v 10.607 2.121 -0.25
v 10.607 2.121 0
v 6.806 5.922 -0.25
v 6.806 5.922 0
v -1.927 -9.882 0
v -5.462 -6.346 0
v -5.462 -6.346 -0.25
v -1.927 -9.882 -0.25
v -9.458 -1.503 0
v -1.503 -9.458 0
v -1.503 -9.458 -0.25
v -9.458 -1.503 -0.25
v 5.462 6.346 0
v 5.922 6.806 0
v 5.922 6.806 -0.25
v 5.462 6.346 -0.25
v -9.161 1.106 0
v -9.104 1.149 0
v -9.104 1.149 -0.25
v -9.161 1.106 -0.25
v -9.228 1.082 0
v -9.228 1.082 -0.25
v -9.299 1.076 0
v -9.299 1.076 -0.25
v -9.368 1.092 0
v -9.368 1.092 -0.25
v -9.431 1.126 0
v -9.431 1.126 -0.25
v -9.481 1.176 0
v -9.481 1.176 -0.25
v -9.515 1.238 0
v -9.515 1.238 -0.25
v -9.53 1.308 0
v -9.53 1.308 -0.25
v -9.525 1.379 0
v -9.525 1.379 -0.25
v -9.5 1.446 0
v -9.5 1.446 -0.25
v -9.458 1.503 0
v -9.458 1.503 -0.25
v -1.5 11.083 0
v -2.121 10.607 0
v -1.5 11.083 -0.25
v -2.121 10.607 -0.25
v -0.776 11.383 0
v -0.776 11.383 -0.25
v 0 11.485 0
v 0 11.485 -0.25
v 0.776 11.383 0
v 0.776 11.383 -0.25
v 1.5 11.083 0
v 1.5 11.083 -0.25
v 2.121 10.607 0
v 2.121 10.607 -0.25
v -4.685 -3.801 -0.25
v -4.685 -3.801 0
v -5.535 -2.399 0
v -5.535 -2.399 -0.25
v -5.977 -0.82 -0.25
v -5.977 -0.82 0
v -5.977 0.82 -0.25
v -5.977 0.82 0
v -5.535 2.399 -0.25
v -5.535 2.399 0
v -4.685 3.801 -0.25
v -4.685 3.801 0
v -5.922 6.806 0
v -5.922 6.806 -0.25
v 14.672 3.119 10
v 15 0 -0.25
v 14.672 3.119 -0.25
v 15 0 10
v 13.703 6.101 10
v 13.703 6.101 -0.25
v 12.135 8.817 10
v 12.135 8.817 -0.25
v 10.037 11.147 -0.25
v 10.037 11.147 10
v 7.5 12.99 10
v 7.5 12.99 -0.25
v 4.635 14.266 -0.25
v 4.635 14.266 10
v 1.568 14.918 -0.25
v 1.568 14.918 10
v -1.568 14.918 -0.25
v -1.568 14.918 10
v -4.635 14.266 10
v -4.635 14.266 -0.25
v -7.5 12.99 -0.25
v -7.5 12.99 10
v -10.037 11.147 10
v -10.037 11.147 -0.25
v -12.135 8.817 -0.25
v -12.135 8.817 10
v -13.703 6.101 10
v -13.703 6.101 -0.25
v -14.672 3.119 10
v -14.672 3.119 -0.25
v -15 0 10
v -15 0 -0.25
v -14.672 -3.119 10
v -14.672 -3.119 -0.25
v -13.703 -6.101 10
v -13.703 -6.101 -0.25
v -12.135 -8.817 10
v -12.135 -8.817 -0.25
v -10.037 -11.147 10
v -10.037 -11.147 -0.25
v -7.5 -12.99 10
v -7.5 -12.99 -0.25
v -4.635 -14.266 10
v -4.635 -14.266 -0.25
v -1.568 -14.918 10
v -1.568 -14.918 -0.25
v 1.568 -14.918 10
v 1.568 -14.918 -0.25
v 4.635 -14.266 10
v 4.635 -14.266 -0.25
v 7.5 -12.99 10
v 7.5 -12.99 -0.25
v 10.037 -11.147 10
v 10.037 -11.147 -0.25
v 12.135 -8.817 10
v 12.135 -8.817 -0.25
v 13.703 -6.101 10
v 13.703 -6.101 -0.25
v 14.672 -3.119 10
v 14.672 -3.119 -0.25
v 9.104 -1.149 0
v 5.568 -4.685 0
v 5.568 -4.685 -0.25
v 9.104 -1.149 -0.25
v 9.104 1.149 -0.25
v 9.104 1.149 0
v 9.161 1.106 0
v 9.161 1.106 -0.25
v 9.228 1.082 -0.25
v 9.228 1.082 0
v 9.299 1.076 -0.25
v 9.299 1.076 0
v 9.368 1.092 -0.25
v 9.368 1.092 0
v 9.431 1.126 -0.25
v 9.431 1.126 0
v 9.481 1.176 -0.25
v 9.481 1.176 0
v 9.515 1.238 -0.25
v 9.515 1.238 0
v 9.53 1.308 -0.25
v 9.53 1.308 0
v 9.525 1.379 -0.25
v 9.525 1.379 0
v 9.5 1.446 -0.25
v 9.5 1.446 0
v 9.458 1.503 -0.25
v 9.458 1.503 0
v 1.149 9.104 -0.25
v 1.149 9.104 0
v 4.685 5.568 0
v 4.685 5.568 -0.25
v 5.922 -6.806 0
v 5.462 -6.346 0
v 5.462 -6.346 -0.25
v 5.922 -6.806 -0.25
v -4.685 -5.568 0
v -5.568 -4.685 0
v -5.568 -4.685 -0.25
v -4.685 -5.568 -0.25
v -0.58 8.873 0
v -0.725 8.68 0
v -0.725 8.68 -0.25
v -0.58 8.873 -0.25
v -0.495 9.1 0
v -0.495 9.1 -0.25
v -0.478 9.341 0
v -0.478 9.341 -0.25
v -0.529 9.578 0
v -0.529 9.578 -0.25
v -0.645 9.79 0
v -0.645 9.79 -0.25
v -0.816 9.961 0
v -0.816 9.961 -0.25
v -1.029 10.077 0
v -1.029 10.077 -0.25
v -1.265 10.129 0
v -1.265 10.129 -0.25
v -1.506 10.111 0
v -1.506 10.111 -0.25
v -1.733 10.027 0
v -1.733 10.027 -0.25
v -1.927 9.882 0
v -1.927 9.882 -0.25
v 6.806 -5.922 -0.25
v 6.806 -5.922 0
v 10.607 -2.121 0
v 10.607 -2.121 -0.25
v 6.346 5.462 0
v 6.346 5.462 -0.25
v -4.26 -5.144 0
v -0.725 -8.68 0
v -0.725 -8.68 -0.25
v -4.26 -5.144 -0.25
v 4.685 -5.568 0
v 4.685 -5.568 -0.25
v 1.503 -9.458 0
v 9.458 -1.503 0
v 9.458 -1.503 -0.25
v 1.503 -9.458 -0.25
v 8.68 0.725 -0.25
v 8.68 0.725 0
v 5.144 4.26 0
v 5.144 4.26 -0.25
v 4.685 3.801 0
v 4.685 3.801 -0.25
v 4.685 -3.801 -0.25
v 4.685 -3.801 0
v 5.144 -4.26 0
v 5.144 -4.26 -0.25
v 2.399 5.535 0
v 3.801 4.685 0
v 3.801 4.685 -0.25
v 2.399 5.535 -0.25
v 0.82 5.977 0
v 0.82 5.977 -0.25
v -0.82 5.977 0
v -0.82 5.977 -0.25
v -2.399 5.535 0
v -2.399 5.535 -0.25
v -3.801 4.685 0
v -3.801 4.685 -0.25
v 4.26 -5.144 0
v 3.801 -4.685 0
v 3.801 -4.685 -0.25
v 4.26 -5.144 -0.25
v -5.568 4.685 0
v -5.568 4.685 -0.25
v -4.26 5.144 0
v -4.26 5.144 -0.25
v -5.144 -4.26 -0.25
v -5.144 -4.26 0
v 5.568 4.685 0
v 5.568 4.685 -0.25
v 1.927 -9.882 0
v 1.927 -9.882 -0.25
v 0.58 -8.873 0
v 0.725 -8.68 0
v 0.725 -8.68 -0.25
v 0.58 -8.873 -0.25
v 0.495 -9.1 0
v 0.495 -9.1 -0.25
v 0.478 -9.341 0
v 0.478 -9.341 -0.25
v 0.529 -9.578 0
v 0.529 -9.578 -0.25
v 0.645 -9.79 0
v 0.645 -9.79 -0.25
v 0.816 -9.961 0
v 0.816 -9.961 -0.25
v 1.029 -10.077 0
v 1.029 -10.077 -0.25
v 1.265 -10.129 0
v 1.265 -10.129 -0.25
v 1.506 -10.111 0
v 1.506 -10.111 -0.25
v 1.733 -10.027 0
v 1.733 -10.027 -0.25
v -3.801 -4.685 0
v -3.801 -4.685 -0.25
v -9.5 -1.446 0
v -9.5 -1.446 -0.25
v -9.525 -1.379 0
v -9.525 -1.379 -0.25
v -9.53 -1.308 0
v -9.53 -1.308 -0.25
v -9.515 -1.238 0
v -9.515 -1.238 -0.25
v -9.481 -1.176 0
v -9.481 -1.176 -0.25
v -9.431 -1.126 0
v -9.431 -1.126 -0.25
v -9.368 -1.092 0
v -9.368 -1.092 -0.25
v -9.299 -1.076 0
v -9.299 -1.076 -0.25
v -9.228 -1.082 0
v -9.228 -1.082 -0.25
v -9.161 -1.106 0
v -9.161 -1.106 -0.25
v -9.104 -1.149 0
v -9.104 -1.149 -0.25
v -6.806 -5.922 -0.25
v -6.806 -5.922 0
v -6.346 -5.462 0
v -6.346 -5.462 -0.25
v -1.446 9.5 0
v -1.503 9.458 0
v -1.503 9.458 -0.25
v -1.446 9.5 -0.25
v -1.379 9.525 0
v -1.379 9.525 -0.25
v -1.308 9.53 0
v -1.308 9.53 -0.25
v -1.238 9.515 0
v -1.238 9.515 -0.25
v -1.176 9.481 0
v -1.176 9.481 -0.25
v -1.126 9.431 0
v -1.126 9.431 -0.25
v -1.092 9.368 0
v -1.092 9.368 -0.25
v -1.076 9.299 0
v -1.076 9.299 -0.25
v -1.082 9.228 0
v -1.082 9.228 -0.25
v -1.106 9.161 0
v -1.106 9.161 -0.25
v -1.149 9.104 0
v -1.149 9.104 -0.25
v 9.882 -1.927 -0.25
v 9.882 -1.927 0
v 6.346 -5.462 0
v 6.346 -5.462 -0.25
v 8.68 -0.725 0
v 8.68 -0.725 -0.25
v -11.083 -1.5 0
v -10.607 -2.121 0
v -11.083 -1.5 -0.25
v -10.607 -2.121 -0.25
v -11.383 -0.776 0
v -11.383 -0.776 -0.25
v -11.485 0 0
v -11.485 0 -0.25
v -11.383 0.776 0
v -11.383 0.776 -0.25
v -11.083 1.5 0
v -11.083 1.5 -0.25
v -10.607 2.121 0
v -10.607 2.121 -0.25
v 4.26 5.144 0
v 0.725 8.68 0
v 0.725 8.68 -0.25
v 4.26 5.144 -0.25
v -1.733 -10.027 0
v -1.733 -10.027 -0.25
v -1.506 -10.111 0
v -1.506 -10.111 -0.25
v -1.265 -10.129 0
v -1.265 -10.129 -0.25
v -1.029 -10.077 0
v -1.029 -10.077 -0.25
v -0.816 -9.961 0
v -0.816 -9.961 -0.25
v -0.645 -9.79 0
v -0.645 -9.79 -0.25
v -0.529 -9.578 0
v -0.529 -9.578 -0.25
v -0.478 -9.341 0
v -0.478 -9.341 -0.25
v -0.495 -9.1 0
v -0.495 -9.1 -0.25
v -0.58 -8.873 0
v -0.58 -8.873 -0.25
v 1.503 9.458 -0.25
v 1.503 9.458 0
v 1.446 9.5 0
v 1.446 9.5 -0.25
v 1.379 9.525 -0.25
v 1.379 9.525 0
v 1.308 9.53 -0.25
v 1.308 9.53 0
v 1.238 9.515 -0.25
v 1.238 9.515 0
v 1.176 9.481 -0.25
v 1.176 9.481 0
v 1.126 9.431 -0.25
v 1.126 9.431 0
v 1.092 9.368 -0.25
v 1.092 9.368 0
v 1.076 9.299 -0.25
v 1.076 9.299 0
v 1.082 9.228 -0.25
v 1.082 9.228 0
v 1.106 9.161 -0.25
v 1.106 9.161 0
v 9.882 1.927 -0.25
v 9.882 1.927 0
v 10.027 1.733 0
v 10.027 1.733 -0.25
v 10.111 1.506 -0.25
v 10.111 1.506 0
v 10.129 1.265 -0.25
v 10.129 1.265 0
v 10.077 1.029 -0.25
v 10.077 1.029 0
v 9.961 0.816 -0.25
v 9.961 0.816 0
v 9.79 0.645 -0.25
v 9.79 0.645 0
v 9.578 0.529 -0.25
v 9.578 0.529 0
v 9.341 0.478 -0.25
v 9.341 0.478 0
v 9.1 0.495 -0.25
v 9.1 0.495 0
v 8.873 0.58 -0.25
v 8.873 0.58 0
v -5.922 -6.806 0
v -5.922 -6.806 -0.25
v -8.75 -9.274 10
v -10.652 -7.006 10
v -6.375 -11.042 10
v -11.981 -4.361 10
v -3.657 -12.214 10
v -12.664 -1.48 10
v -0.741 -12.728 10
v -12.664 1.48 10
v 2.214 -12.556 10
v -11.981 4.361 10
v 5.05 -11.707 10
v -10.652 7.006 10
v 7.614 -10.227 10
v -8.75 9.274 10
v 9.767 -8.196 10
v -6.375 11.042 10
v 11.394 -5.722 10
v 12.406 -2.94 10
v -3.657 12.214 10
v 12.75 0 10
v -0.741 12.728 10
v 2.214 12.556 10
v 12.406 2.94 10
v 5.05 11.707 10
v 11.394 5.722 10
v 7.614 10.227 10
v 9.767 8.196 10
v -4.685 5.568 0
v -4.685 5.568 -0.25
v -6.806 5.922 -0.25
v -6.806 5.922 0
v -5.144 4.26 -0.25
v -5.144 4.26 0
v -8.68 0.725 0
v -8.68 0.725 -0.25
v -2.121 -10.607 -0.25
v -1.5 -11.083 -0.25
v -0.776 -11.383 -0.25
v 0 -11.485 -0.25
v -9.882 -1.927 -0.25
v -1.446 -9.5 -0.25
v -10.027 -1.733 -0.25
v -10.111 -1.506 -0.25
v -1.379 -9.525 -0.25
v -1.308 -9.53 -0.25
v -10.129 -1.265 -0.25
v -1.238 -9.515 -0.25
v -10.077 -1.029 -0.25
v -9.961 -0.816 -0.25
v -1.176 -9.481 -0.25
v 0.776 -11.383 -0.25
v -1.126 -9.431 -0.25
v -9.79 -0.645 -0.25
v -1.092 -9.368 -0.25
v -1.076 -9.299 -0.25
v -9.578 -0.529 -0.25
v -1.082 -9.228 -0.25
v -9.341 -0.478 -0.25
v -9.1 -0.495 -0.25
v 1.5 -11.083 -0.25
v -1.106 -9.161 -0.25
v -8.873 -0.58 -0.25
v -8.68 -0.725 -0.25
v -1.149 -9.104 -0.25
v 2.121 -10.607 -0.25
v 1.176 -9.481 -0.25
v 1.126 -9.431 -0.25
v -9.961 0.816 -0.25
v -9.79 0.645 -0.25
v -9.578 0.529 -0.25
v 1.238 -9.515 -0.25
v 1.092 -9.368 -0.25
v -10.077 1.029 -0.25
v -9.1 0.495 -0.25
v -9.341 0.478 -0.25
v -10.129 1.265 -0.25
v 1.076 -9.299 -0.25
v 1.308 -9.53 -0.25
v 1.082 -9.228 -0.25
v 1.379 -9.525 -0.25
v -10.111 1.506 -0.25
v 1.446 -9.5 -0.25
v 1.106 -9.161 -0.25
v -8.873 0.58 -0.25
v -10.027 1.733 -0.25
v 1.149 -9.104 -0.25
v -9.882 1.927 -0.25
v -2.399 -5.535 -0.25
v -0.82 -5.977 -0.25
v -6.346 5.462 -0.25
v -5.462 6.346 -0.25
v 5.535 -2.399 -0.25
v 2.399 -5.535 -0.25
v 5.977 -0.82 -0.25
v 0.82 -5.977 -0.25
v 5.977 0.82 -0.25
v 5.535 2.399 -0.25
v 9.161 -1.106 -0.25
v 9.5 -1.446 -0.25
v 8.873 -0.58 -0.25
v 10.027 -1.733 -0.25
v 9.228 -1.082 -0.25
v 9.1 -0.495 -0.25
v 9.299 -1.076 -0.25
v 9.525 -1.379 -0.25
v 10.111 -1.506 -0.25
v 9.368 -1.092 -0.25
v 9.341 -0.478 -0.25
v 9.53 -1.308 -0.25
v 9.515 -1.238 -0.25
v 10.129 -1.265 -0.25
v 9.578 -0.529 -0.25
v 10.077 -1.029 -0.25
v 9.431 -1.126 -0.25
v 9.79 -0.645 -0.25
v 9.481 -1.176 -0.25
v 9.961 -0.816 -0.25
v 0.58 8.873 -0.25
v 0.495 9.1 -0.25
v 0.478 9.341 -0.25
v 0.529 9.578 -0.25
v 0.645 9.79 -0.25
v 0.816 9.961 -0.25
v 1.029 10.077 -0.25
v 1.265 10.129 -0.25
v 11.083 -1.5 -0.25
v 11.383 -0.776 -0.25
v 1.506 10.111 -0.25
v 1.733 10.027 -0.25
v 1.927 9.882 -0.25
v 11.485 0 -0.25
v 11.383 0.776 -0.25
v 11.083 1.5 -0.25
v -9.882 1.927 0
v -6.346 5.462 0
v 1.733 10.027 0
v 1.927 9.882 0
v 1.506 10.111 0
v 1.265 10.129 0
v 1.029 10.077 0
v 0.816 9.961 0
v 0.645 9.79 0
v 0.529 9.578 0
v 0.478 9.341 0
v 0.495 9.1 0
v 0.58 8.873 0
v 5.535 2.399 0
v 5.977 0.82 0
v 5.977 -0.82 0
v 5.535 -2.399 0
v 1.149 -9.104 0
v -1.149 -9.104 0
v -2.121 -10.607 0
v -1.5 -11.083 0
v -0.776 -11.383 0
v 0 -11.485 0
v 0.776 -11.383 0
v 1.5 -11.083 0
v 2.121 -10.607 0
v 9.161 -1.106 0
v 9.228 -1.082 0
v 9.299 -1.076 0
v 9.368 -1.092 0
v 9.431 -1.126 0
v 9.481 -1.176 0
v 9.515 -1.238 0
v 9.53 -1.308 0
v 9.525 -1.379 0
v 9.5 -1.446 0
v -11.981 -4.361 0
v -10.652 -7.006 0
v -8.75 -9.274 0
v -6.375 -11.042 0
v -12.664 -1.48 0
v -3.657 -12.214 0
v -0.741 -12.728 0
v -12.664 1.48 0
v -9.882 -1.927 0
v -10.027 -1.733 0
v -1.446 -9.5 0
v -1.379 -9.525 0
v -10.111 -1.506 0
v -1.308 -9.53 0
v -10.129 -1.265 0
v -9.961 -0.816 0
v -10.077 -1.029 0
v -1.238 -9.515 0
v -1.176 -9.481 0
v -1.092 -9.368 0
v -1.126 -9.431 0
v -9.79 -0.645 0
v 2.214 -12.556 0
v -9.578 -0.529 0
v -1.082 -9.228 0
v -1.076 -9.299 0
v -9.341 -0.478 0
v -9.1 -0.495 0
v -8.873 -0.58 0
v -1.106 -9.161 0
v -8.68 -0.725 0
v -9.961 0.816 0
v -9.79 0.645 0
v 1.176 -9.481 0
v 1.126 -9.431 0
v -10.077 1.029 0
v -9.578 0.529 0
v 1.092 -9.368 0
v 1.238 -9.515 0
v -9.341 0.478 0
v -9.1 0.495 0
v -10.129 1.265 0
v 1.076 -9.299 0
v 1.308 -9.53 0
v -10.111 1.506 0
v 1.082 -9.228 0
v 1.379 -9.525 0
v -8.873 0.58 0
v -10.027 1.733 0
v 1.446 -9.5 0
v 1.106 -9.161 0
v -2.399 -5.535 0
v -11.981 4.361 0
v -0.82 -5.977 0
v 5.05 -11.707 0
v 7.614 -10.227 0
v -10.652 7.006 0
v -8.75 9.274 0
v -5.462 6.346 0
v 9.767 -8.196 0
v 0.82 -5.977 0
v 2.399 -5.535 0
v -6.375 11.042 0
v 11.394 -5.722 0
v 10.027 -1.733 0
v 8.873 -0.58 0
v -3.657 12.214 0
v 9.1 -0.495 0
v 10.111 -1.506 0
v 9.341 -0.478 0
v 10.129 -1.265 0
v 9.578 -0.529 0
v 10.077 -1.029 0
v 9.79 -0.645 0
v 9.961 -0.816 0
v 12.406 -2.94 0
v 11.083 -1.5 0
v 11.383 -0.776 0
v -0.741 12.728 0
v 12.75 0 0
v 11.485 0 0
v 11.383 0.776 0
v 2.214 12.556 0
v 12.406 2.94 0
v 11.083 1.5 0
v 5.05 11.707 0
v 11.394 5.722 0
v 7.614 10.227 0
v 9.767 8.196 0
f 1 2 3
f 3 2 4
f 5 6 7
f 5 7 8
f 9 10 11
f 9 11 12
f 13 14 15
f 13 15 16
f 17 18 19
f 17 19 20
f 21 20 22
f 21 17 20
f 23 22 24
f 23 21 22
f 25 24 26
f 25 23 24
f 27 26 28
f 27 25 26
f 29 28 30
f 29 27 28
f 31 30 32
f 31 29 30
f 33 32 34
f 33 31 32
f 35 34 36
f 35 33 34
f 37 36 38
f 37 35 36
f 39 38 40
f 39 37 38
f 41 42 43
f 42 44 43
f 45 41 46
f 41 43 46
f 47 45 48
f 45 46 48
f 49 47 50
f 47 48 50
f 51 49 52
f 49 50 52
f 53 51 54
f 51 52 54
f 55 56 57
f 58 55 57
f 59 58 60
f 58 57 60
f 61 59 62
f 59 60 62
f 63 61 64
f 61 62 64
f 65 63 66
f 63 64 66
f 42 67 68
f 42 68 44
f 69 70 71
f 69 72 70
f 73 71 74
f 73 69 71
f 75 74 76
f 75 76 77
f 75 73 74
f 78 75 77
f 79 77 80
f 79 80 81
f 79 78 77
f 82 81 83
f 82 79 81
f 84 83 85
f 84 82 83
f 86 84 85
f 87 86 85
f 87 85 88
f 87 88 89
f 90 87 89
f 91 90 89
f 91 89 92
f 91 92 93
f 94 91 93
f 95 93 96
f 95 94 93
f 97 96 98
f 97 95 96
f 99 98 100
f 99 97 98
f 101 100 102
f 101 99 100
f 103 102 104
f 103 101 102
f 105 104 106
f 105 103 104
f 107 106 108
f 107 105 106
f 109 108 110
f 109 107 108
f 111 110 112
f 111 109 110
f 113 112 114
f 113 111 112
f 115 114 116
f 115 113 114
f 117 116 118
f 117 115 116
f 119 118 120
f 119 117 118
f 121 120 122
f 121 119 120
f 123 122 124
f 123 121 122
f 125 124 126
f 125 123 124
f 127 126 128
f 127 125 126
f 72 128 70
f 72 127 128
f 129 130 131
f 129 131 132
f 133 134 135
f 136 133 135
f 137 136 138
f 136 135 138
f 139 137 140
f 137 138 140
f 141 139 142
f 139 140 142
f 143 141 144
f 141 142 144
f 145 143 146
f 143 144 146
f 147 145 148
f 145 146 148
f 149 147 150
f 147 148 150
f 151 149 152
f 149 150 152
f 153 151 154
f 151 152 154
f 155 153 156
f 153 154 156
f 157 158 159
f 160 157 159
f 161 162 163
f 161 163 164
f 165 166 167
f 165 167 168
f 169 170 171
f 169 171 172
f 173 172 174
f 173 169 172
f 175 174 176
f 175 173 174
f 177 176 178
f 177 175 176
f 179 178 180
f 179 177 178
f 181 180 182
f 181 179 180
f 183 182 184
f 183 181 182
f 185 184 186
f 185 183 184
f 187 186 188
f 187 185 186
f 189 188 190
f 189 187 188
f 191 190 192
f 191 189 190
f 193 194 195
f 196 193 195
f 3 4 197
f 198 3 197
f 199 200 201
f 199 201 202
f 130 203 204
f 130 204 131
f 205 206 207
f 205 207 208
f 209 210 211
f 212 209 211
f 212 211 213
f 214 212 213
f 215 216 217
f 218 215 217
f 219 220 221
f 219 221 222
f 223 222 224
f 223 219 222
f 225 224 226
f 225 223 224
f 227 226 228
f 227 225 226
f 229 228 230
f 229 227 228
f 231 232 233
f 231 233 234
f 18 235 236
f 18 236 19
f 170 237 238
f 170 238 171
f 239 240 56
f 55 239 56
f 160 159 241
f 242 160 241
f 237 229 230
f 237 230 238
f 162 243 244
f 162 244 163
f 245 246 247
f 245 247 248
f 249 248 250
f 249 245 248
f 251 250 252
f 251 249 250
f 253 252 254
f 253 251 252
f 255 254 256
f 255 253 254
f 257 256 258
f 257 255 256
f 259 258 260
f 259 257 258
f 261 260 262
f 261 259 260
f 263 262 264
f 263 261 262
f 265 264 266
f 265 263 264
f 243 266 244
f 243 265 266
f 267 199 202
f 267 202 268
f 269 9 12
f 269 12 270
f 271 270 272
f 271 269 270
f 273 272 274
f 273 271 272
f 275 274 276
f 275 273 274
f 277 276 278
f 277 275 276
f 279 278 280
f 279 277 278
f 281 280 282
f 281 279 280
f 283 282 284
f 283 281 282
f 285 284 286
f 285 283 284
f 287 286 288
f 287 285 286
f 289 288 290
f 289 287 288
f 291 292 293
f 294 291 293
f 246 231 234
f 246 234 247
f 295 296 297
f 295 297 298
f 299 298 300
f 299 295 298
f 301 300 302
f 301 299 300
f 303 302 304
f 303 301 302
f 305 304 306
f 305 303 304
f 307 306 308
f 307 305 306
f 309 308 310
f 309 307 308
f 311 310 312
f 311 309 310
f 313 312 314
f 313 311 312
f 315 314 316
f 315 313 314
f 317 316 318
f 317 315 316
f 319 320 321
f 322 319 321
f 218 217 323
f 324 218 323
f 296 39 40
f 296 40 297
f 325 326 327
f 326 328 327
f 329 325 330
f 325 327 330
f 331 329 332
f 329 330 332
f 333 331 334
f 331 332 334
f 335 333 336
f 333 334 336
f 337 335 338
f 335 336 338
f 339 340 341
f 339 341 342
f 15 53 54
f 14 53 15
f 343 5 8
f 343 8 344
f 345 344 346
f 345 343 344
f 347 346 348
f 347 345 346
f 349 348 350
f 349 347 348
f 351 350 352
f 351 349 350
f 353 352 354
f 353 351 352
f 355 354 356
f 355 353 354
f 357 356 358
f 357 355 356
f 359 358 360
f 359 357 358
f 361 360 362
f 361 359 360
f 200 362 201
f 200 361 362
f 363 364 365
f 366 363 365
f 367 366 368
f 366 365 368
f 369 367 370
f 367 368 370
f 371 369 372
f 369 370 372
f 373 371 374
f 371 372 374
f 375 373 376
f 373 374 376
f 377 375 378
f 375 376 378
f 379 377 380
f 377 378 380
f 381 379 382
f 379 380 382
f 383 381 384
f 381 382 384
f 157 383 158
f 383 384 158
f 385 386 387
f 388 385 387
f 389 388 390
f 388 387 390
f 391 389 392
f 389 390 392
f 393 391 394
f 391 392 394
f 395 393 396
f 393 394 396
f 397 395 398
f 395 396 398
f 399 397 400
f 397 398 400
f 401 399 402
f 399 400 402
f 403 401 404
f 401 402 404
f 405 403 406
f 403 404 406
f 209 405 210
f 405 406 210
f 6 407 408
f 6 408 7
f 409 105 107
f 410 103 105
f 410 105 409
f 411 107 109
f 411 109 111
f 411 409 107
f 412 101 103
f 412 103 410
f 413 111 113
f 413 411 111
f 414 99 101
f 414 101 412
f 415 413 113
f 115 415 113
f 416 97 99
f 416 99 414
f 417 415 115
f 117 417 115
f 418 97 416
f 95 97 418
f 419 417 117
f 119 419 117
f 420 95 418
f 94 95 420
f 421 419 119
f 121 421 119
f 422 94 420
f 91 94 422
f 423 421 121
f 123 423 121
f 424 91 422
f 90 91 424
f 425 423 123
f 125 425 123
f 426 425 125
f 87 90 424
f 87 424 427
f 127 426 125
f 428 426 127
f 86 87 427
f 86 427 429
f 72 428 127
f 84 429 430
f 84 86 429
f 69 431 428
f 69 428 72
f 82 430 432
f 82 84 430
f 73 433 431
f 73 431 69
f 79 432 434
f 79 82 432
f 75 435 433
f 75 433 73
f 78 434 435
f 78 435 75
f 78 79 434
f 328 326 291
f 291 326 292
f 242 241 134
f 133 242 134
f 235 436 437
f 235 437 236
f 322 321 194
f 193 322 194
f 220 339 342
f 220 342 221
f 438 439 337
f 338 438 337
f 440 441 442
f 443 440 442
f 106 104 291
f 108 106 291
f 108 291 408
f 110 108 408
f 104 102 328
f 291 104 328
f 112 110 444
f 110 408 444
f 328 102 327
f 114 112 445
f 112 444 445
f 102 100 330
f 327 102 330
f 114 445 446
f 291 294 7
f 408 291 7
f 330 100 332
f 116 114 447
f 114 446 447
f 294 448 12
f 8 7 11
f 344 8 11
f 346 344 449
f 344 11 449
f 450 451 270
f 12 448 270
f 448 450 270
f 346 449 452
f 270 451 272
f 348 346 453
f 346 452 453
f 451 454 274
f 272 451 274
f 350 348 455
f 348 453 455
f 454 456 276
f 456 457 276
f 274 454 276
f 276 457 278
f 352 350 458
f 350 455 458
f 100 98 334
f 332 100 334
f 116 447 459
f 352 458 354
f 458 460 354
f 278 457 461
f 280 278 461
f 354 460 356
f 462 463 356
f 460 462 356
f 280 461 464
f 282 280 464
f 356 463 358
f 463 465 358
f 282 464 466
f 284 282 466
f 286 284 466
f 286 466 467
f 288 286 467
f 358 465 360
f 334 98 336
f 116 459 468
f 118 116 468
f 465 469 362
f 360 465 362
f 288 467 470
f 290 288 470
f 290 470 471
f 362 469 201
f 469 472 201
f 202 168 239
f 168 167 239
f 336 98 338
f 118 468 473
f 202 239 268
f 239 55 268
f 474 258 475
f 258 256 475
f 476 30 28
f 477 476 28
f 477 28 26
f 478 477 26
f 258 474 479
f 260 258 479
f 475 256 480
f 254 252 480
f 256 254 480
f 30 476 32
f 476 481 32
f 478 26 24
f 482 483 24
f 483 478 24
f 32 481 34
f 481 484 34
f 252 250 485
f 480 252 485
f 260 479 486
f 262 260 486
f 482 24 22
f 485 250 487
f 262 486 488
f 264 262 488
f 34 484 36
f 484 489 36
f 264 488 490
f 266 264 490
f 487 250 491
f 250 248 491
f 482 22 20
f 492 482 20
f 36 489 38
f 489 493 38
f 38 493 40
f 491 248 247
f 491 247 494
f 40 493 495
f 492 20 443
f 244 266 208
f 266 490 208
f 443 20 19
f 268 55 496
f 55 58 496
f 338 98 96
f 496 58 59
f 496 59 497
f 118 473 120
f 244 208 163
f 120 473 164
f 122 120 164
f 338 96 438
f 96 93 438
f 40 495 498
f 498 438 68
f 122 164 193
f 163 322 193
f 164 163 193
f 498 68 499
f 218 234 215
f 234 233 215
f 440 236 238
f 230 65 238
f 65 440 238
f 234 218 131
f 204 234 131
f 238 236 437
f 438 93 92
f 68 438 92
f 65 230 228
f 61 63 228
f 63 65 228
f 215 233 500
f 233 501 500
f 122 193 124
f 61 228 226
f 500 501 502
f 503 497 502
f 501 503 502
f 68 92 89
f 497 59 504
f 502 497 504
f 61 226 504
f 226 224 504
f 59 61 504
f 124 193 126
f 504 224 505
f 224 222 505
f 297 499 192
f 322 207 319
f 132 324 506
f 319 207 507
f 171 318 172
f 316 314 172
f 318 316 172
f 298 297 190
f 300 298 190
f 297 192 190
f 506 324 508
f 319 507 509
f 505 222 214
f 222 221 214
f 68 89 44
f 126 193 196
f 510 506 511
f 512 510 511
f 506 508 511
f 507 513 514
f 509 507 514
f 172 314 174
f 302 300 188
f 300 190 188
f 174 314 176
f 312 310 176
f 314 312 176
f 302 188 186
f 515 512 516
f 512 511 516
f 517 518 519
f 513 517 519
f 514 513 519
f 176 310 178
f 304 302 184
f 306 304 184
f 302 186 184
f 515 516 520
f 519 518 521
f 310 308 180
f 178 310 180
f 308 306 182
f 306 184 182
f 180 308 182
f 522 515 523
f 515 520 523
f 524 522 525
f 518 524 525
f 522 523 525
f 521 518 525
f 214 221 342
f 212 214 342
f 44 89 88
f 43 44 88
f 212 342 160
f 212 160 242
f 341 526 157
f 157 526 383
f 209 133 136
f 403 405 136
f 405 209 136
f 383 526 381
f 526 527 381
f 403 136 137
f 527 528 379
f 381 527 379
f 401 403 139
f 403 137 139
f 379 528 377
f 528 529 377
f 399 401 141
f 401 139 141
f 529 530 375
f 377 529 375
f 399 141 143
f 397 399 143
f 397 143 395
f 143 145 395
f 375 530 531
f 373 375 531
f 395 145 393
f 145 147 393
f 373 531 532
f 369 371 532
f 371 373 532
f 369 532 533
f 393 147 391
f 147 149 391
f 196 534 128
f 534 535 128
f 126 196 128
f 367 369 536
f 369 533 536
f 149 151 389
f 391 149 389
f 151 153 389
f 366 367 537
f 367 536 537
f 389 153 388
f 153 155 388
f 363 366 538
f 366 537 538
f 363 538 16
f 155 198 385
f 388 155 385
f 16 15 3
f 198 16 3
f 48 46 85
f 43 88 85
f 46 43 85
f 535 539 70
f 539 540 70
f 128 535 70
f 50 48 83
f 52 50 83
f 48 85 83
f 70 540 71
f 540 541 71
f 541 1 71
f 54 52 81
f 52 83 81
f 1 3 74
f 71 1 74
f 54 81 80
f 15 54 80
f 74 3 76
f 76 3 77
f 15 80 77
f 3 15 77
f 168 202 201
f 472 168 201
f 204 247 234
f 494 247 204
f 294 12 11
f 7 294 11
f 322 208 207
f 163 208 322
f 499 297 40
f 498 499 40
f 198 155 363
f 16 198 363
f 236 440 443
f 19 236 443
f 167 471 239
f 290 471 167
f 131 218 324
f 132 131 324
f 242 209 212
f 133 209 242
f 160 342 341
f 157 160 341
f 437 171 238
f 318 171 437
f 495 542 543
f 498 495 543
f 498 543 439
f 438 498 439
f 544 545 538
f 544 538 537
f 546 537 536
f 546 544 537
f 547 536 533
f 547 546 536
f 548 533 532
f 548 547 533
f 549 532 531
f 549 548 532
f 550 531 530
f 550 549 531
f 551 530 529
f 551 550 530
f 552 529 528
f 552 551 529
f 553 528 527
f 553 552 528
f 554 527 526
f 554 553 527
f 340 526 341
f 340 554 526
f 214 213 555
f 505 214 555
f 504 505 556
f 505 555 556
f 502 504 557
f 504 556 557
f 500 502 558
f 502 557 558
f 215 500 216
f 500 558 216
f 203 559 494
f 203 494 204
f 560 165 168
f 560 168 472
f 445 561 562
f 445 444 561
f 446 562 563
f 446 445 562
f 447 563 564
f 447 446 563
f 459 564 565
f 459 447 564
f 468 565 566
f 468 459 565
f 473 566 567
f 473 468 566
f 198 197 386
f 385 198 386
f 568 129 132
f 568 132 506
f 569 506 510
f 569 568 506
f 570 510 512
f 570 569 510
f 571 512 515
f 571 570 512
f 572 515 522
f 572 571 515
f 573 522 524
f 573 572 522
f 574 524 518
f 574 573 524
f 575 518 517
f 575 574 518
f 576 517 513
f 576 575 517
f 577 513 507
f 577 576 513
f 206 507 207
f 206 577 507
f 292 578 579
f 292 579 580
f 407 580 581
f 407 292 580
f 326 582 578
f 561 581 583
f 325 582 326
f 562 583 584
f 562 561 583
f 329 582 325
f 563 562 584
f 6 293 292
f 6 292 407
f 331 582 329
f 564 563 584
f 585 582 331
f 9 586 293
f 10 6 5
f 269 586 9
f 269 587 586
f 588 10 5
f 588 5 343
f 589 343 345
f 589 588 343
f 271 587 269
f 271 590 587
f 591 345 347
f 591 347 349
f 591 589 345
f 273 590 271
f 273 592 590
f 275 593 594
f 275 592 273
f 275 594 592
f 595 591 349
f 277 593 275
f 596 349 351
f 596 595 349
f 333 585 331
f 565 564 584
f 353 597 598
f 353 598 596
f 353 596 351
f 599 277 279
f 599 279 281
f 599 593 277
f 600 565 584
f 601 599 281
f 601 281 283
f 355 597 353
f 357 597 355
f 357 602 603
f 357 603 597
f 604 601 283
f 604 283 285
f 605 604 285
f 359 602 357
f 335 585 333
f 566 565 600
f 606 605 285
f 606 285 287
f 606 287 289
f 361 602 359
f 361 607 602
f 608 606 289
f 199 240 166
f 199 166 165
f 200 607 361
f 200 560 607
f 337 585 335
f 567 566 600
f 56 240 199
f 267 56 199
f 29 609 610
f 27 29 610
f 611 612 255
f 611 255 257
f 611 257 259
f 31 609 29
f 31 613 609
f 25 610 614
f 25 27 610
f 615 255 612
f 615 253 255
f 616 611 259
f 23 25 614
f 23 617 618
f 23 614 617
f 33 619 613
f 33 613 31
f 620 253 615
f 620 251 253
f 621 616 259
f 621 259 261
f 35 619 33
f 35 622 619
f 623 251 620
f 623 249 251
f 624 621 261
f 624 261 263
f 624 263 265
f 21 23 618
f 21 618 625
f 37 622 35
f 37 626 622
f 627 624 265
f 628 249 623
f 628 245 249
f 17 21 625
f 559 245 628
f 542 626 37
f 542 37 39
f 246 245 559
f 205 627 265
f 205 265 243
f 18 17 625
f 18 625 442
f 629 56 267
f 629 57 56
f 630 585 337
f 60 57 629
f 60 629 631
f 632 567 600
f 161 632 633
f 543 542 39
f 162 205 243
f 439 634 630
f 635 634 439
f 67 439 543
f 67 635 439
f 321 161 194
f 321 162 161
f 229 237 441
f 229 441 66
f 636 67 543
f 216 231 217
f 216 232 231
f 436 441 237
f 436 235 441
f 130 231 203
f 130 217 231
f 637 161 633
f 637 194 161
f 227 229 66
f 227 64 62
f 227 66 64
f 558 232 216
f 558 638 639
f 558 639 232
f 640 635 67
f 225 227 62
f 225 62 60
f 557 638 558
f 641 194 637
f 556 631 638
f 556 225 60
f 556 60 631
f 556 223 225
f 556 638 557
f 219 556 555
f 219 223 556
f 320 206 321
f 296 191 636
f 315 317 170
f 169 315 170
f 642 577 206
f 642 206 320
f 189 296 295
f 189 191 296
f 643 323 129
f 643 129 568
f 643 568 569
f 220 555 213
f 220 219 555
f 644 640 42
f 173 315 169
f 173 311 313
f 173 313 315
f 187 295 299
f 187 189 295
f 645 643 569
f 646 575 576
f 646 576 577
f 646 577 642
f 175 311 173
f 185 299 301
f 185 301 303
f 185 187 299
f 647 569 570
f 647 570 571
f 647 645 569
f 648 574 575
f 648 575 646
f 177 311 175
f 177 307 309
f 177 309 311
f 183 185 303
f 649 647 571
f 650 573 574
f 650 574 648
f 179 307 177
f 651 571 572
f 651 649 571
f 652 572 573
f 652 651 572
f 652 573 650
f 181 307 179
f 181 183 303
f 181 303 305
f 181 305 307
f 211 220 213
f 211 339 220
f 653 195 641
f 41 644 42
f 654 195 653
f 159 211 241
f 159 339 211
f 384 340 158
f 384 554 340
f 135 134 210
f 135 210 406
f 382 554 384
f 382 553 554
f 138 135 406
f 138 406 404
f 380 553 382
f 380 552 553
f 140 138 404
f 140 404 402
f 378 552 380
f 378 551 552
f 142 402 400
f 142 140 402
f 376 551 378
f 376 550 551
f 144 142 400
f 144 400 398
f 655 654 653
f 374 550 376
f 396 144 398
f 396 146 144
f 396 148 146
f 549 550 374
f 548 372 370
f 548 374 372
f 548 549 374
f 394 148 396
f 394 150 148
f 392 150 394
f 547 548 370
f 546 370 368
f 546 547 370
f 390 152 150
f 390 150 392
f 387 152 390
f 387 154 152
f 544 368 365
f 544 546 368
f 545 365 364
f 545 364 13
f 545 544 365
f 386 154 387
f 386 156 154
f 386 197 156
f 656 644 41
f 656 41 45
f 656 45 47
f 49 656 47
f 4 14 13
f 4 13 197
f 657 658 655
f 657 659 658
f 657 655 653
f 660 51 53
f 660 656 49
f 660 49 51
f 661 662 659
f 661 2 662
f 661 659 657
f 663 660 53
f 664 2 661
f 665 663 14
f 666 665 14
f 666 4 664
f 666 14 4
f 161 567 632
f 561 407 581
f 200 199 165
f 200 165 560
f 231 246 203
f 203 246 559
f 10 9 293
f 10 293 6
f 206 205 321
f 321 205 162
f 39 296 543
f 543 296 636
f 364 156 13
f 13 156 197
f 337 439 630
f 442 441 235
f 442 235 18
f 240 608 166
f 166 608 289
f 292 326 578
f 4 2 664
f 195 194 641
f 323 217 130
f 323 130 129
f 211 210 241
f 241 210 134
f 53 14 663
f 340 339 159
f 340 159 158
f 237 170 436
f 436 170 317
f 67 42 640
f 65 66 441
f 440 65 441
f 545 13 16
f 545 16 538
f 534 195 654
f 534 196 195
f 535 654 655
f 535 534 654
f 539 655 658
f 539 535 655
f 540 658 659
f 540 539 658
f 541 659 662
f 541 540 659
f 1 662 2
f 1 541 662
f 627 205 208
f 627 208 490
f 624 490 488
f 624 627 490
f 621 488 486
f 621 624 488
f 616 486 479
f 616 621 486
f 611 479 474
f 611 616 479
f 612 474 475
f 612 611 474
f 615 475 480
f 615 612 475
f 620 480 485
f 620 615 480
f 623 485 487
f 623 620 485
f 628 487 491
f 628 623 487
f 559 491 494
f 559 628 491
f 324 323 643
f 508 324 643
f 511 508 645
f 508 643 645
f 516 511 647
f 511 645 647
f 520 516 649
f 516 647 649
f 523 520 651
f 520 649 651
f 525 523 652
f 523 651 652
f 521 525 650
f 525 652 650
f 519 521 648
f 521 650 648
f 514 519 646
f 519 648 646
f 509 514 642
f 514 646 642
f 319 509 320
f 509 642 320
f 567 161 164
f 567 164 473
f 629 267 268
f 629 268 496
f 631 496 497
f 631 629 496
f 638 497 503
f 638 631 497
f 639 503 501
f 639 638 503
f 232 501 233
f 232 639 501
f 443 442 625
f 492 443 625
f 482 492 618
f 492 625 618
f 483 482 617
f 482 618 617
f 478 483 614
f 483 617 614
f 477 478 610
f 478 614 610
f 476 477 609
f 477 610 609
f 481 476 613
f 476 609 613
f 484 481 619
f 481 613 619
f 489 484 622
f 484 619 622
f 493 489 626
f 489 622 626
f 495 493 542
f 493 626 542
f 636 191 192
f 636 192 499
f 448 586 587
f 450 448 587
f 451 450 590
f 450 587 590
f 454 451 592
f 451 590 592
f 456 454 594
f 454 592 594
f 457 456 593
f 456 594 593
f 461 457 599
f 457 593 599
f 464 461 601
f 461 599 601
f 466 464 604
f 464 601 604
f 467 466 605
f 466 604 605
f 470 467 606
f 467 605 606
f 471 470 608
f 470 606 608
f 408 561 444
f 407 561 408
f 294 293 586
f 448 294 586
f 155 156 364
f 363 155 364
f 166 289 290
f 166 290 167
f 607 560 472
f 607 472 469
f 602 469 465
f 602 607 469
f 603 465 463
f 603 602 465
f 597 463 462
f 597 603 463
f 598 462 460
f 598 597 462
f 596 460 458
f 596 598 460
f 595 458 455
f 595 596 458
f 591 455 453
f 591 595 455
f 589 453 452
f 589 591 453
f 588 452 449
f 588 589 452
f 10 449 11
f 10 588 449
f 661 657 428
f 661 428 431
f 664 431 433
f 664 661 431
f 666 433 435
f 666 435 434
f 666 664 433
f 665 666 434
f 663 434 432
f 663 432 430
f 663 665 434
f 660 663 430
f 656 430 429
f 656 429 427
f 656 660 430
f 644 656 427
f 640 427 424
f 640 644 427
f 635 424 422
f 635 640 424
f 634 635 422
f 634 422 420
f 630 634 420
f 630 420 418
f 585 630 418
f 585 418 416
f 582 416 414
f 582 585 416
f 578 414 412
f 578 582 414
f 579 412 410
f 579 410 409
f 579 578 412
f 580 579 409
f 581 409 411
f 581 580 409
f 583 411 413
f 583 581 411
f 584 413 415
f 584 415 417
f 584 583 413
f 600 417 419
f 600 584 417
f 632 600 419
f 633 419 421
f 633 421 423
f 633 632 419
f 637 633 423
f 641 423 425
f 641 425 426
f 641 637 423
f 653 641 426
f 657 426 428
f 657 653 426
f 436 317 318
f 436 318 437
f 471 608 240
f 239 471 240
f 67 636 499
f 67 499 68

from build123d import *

# Parameters (mm, degrees)
SKETCH1_R           = 15
SKETCH1_R_2         = 12.75
BOSS_EXTRUDE1_DEPTH = 10
SKETCH2_R           = 15
BOSS_EXTRUDE2_DEPTH = 0.25
FILLET1_R           = 3


with BuildPart() as part:
    # Sketch1 → Boss-Extrude1 (new body)
    with BuildSketch(Plane.XY):
        Circle(SKETCH1_R)
        Circle(SKETCH1_R_2, mode=Mode.SUBTRACT)
    extrude(amount=BOSS_EXTRUDE1_DEPTH)

    # Sketch2 → Boss-Extrude2 (add)
    with BuildSketch(Plane.XY):
        Circle(SKETCH2_R)
        with BuildLine():
            Line((5.922042758, 5.03811235), (5.03811235, 5.922042758))
            Line((5.03811235, 5.922042758), (1.502578444, 9.457576664))
            ThreePointArc((1.502578444, 9.457576664), (1.149025054, 9.457576664), (1.149025054, 9.104023274))
            Line((1.149025054, 9.104023274), (4.684558959, 5.568489368))
            Line((4.684558959, 5.568489368), (5.568489368, 4.684558959))
            Line((5.568489368, 4.684558959), (9.104023274, 1.149025054))
            ThreePointArc((9.104023274, 1.149025054), (9.457576664, 1.149025054), (9.457576664, 1.502578444))
            Line((9.457576664, 1.502578444), (5.922042758, 5.03811235))
        make_face(mode=Mode.SUBTRACT)
        with BuildLine():
            Line((6.346306827, 5.462376419), (9.881840733, 1.926842513))
            ThreePointArc((9.881840733, 1.926842513), (9.881840733, 0.724760985), (8.679759205, 0.724760985))
            Line((8.679759205, 0.724760985), (5.144225299, 4.260294891))
            Line((5.144225299, 4.260294891), (4.684605891, 3.800675483))
            ThreePointArc((4.684605891, 3.800675483), (6.032467694, 0), (4.684605891, -3.800675483))
            Line((4.684605891, -3.800675483), (5.144225299, -4.260294891))
            Line((5.144225299, -4.260294891), (8.679759205, -0.724760985))
            ThreePointArc((8.679759205, -0.724760985), (9.881840733, -0.724760985), (9.881840733, -1.926842513))
            Line((9.881840733, -1.926842513), (6.346306827, -5.462376419))
            Line((6.346306827, -5.462376419), (6.805926235, -5.921995827))
            Line((6.805926235, -5.921995827), (12.727922061, 0))
            Line((12.727922061, 0), (6.805926235, 5.921995827))
            Line((6.805926235, 5.921995827), (6.346306827, 5.462376419))
        make_face(mode=Mode.SUBTRACT)
        with BuildLine():
            Line((5.462376419, 6.346306827), (1.926842513, 9.881840733))
            ThreePointArc((1.926842513, 9.881840733), (0.724760985, 9.881840733), (0.724760985, 8.679759205))
            Line((0.724760985, 8.679759205), (4.260294891, 5.144225299))
            Line((4.260294891, 5.144225299), (3.800675483, 4.684605891))
            ThreePointArc((3.800675483, 4.684605891), (0, 6.032467694), (-3.800675483, 4.684605891))
            Line((-3.800675483, 4.684605891), (-4.260294891, 5.144225299))
            Line((-4.260294891, 5.144225299), (-0.724760985, 8.679759205))
            ThreePointArc((-0.724760985, 8.679759205), (-0.724760985, 9.881840733), (-1.926842513, 9.881840733))
            Line((-1.926842513, 9.881840733), (-5.462376419, 6.346306827))
            Line((-5.462376419, 6.346306827), (-5.921995827, 6.805926235))
            Line((-5.921995827, 6.805926235), (0, 12.727922061))
            Line((0, 12.727922061), (5.921995827, 6.805926235))
            Line((5.921995827, 6.805926235), (5.462376419, 6.346306827))
        make_face(mode=Mode.SUBTRACT)
        with BuildLine():
            Line((-5.568489368, 4.684558959), (-9.104023274, 1.149025054))
            ThreePointArc((-9.104023274, 1.149025054), (-9.457576664, 1.149025054), (-9.457576664, 1.502578444))
            Line((-9.457576664, 1.502578444), (-5.922042758, 5.03811235))
            Line((-5.922042758, 5.03811235), (-5.03811235, 5.922042758))
            Line((-5.03811235, 5.922042758), (-1.502578444, 9.457576664))
            ThreePointArc((-1.502578444, 9.457576664), (-1.149025054, 9.457576664), (-1.149025054, 9.104023274))
            Line((-1.149025054, 9.104023274), (-4.684558959, 5.568489368))
            Line((-4.684558959, 5.568489368), (-5.568489368, 4.684558959))
        make_face(mode=Mode.SUBTRACT)
        with BuildLine():
            Line((-6.346306827, 5.462376419), (-6.805926235, 5.921995827))
            Line((-6.805926235, 5.921995827), (-12.727922061, 0))
            Line((-12.727922061, 0), (-6.805926235, -5.921995827))
            Line((-6.805926235, -5.921995827), (-6.346306827, -5.462376419))
            Line((-6.346306827, -5.462376419), (-9.881840733, -1.926842513))
            ThreePointArc((-9.881840733, -1.926842513), (-9.881840733, -0.724760985), (-8.679759205, -0.724760985))
            Line((-8.679759205, -0.724760985), (-5.144225299, -4.260294891))
            Line((-5.144225299, -4.260294891), (-4.684605891, -3.800675483))
            ThreePointArc((-4.684605891, -3.800675483), (-6.032467694, 0), (-4.684605891, 3.800675483))
            Line((-4.684605891, 3.800675483), (-5.144225299, 4.260294891))
            Line((-5.144225299, 4.260294891), (-8.679759205, 0.724760985))
            ThreePointArc((-8.679759205, 0.724760985), (-9.881840733, 0.724760985), (-9.881840733, 1.926842513))
            Line((-9.881840733, 1.926842513), (-6.346306827, 5.462376419))
        make_face(mode=Mode.SUBTRACT)
        with BuildLine():
            Line((5.462376419, -6.346306827), (5.921995827, -6.805926235))
            Line((5.921995827, -6.805926235), (0, -12.727922061))
            Line((0, -12.727922061), (-5.921995827, -6.805926235))
            Line((-5.921995827, -6.805926235), (-5.462376419, -6.346306827))
            Line((-5.462376419, -6.346306827), (-1.926842513, -9.881840733))
            ThreePointArc((-1.926842513, -9.881840733), (-0.724760985, -9.881840733), (-0.724760985, -8.679759205))
            Line((-0.724760985, -8.679759205), (-4.260294891, -5.144225299))
            Line((-4.260294891, -5.144225299), (-3.800675483, -4.684605891))
            ThreePointArc((-3.800675483, -4.684605891), (0, -6.032467694), (3.800675483, -4.684605891))
            Line((3.800675483, -4.684605891), (4.260294891, -5.144225299))
            Line((4.260294891, -5.144225299), (0.724760985, -8.679759205))
            ThreePointArc((0.724760985, -8.679759205), (0.724760985, -9.881840733), (1.926842513, -9.881840733))
            Line((1.926842513, -9.881840733), (5.462376419, -6.346306827))
        make_face(mode=Mode.SUBTRACT)
        with BuildLine():
            Line((5.568489368, -4.684558959), (9.104023274, -1.149025054))
            ThreePointArc((9.104023274, -1.149025054), (9.457576664, -1.149025054), (9.457576664, -1.502578444))
            Line((9.457576664, -1.502578444), (5.922042758, -5.03811235))
            Line((5.922042758, -5.03811235), (5.03811235, -5.922042758))
            Line((5.03811235, -5.922042758), (1.502578444, -9.457576664))
            ThreePointArc((1.502578444, -9.457576664), (1.149025054, -9.457576664), (1.149025054, -9.104023274))
            Line((1.149025054, -9.104023274), (4.684558959, -5.568489368))
            Line((4.684558959, -5.568489368), (5.568489368, -4.684558959))
        make_face(mode=Mode.SUBTRACT)
        with BuildLine():
            Line((-5.568489368, -4.684558959), (-4.684558959, -5.568489368))
            Line((-4.684558959, -5.568489368), (-1.149025054, -9.104023274))
            ThreePointArc((-1.149025054, -9.104023274), (-1.149025054, -9.457576664), (-1.502578444, -9.457576664))
            Line((-1.502578444, -9.457576664), (-5.03811235, -5.922042758))
            Line((-5.03811235, -5.922042758), (-5.922042758, -5.03811235))
            Line((-5.922042758, -5.03811235), (-9.457576664, -1.502578444))
            ThreePointArc((-9.457576664, -1.502578444), (-9.457576664, -1.149025054), (-9.104023274, -1.149025054))
            Line((-9.104023274, -1.149025054), (-5.568489368, -4.684558959))
        make_face(mode=Mode.SUBTRACT)
    extrude(amount=-BOSS_EXTRUDE2_DEPTH)

    # Fillet1
    fillet1_edges = [part.edges().sort_by_distance(p)[0] for p in [
        (0, -12.727922061, -0.125),
        (-12.727922061, 0, -0.125),
        (0, 12.727922061, -0.125),
        (12.727922061, 0, -0.125),
    ]]
    fillet(fillet1_edges, radius=FILLET1_R)


solid = part.part
